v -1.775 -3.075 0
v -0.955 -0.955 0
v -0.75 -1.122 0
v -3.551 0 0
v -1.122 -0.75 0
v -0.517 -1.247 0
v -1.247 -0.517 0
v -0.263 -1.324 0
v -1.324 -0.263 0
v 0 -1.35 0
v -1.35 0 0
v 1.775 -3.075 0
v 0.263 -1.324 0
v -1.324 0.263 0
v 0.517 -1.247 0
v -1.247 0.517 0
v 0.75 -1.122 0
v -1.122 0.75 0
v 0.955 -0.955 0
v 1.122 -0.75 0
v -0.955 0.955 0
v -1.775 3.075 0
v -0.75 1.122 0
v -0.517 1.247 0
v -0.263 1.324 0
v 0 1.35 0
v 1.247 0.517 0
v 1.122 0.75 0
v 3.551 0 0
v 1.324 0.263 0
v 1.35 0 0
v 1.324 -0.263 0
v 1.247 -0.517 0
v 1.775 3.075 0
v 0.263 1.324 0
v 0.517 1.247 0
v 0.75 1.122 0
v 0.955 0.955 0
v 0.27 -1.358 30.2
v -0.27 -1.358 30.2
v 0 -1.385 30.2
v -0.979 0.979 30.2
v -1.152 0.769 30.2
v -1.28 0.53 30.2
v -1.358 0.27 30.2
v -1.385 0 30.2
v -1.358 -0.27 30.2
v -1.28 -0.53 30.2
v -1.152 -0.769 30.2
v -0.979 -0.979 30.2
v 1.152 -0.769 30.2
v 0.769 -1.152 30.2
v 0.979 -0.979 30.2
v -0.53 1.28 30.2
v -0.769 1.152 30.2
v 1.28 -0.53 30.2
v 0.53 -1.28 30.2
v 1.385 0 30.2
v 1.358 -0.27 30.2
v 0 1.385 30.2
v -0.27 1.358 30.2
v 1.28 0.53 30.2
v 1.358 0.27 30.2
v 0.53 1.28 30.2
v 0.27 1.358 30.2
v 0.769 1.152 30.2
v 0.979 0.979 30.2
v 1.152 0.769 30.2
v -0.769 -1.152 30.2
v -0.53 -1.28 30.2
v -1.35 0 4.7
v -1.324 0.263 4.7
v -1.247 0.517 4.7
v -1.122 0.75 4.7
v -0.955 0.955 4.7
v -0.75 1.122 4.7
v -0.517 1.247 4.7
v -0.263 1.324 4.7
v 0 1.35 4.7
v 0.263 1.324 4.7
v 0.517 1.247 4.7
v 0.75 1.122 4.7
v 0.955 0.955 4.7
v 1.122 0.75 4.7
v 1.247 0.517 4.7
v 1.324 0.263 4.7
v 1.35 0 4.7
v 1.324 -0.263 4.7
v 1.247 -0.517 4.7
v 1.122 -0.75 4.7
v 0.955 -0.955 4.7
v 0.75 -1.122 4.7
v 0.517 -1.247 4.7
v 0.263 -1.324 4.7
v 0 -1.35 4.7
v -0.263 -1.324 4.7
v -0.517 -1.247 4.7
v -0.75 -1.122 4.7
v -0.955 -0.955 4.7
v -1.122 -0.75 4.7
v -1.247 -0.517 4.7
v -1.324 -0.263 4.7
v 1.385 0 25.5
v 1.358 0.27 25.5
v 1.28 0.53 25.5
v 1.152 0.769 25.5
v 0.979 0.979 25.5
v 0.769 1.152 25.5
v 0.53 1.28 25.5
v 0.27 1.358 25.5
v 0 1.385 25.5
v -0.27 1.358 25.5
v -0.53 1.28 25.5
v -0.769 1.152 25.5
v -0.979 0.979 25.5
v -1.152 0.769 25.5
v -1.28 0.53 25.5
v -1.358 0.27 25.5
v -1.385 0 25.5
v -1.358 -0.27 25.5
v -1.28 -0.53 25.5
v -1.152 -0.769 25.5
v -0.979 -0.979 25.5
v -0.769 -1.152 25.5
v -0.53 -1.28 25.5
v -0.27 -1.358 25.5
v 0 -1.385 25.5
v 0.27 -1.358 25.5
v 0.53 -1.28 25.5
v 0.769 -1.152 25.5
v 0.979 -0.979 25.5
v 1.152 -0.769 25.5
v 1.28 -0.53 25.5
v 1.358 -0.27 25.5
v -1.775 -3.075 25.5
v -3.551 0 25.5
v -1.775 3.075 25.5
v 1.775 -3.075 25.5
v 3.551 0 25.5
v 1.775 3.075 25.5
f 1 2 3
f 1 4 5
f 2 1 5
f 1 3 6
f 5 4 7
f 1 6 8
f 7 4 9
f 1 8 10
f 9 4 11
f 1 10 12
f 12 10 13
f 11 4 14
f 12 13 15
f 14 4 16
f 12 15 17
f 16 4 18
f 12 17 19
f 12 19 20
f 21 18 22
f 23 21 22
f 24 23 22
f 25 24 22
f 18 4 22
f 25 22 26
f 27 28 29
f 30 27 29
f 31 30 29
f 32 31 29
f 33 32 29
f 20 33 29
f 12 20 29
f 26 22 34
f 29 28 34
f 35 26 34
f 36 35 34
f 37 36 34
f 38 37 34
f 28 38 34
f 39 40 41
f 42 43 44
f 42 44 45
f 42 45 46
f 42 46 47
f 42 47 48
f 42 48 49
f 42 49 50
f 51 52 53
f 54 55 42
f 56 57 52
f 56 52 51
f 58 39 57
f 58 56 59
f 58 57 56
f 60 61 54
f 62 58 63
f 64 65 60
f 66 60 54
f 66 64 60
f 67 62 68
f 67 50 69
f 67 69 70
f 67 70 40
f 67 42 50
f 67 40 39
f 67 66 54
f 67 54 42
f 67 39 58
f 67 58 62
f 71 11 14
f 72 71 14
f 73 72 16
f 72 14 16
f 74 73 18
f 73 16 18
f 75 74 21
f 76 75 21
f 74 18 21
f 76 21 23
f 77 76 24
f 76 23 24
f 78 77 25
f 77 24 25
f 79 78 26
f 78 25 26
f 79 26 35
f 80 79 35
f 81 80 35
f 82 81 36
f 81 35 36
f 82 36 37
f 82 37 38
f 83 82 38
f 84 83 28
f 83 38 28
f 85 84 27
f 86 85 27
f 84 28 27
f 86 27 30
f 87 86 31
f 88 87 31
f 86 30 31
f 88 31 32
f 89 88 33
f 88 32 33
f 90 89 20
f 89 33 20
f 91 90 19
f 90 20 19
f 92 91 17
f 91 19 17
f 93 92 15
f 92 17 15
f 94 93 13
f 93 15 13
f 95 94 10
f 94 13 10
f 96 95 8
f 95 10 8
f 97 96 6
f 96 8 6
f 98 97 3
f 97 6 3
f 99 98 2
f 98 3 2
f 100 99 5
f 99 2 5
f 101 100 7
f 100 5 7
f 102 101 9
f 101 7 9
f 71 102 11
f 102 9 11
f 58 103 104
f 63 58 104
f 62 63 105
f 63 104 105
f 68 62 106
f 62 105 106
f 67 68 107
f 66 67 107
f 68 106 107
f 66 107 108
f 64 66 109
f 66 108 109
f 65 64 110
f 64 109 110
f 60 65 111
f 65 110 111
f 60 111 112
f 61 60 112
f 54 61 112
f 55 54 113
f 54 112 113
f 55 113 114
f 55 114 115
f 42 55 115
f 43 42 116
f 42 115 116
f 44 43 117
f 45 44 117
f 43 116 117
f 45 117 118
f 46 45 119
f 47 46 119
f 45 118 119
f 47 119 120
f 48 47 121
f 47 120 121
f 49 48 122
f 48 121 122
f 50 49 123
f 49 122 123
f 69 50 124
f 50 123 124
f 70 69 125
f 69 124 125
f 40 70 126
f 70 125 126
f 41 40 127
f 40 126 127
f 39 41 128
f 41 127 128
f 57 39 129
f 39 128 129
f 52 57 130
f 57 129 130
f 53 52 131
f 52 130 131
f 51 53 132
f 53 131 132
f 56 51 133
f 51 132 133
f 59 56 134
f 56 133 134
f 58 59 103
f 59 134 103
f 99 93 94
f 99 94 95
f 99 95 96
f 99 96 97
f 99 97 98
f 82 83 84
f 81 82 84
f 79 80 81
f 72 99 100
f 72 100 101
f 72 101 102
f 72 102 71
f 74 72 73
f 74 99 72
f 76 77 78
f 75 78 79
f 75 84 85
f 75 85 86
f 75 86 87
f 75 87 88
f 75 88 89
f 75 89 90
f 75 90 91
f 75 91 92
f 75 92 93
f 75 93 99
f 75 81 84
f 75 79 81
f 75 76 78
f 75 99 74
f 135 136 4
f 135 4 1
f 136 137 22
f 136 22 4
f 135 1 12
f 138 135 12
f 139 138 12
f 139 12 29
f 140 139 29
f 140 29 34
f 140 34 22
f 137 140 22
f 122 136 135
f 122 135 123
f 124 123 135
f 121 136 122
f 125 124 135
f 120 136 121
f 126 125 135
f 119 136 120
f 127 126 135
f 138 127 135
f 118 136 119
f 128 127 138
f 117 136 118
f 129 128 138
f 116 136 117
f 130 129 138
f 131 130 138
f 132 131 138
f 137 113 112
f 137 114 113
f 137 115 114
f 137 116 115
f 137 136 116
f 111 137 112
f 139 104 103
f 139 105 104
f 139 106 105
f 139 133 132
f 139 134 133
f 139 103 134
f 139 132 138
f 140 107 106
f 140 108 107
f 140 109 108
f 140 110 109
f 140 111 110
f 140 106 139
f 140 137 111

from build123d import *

# Parameters (mm, degrees)
BOSS_EXTRU_1_DEPTH      = 25.5
ESQUISSE2_R             = 1.385
BOSS_EXTRU_2_DEPTH      = 4.7
ESQUISSE3_R             = 1.35
ENL_V_MAT_EXTRU_1_DEPTH = 4.7


with BuildPart() as part:
    # Esquisse1 → Boss.-Extru.1 (new body)
    with BuildSketch(Plane.XY):
        Polygon((3.550704156, 0), (1.775352078, 3.075), (-1.775352078, 3.075), (-3.550704156, 0), (-1.775352078, -3.075), (1.775352078, -3.075), align=None)
    extrude(amount=BOSS_EXTRU_1_DEPTH)

    # Esquisse2 → Boss.-Extru.2 (add)
    with BuildSketch(Plane.XY.offset(25.5)):
        Circle(ESQUISSE2_R)
    extrude(amount=BOSS_EXTRU_2_DEPTH)

    # Esquisse3 → Enlèv. mat.-Extru.1 (cut)
    with BuildSketch(Plane(origin=(0, 0, 0), x_dir=(-1, 0, 0), z_dir=(0, 0, -1))):
        Circle(ESQUISSE3_R)
    extrude(amount=-ENL_V_MAT_EXTRU_1_DEPTH, mode=Mode.SUBTRACT)


solid = part.part
